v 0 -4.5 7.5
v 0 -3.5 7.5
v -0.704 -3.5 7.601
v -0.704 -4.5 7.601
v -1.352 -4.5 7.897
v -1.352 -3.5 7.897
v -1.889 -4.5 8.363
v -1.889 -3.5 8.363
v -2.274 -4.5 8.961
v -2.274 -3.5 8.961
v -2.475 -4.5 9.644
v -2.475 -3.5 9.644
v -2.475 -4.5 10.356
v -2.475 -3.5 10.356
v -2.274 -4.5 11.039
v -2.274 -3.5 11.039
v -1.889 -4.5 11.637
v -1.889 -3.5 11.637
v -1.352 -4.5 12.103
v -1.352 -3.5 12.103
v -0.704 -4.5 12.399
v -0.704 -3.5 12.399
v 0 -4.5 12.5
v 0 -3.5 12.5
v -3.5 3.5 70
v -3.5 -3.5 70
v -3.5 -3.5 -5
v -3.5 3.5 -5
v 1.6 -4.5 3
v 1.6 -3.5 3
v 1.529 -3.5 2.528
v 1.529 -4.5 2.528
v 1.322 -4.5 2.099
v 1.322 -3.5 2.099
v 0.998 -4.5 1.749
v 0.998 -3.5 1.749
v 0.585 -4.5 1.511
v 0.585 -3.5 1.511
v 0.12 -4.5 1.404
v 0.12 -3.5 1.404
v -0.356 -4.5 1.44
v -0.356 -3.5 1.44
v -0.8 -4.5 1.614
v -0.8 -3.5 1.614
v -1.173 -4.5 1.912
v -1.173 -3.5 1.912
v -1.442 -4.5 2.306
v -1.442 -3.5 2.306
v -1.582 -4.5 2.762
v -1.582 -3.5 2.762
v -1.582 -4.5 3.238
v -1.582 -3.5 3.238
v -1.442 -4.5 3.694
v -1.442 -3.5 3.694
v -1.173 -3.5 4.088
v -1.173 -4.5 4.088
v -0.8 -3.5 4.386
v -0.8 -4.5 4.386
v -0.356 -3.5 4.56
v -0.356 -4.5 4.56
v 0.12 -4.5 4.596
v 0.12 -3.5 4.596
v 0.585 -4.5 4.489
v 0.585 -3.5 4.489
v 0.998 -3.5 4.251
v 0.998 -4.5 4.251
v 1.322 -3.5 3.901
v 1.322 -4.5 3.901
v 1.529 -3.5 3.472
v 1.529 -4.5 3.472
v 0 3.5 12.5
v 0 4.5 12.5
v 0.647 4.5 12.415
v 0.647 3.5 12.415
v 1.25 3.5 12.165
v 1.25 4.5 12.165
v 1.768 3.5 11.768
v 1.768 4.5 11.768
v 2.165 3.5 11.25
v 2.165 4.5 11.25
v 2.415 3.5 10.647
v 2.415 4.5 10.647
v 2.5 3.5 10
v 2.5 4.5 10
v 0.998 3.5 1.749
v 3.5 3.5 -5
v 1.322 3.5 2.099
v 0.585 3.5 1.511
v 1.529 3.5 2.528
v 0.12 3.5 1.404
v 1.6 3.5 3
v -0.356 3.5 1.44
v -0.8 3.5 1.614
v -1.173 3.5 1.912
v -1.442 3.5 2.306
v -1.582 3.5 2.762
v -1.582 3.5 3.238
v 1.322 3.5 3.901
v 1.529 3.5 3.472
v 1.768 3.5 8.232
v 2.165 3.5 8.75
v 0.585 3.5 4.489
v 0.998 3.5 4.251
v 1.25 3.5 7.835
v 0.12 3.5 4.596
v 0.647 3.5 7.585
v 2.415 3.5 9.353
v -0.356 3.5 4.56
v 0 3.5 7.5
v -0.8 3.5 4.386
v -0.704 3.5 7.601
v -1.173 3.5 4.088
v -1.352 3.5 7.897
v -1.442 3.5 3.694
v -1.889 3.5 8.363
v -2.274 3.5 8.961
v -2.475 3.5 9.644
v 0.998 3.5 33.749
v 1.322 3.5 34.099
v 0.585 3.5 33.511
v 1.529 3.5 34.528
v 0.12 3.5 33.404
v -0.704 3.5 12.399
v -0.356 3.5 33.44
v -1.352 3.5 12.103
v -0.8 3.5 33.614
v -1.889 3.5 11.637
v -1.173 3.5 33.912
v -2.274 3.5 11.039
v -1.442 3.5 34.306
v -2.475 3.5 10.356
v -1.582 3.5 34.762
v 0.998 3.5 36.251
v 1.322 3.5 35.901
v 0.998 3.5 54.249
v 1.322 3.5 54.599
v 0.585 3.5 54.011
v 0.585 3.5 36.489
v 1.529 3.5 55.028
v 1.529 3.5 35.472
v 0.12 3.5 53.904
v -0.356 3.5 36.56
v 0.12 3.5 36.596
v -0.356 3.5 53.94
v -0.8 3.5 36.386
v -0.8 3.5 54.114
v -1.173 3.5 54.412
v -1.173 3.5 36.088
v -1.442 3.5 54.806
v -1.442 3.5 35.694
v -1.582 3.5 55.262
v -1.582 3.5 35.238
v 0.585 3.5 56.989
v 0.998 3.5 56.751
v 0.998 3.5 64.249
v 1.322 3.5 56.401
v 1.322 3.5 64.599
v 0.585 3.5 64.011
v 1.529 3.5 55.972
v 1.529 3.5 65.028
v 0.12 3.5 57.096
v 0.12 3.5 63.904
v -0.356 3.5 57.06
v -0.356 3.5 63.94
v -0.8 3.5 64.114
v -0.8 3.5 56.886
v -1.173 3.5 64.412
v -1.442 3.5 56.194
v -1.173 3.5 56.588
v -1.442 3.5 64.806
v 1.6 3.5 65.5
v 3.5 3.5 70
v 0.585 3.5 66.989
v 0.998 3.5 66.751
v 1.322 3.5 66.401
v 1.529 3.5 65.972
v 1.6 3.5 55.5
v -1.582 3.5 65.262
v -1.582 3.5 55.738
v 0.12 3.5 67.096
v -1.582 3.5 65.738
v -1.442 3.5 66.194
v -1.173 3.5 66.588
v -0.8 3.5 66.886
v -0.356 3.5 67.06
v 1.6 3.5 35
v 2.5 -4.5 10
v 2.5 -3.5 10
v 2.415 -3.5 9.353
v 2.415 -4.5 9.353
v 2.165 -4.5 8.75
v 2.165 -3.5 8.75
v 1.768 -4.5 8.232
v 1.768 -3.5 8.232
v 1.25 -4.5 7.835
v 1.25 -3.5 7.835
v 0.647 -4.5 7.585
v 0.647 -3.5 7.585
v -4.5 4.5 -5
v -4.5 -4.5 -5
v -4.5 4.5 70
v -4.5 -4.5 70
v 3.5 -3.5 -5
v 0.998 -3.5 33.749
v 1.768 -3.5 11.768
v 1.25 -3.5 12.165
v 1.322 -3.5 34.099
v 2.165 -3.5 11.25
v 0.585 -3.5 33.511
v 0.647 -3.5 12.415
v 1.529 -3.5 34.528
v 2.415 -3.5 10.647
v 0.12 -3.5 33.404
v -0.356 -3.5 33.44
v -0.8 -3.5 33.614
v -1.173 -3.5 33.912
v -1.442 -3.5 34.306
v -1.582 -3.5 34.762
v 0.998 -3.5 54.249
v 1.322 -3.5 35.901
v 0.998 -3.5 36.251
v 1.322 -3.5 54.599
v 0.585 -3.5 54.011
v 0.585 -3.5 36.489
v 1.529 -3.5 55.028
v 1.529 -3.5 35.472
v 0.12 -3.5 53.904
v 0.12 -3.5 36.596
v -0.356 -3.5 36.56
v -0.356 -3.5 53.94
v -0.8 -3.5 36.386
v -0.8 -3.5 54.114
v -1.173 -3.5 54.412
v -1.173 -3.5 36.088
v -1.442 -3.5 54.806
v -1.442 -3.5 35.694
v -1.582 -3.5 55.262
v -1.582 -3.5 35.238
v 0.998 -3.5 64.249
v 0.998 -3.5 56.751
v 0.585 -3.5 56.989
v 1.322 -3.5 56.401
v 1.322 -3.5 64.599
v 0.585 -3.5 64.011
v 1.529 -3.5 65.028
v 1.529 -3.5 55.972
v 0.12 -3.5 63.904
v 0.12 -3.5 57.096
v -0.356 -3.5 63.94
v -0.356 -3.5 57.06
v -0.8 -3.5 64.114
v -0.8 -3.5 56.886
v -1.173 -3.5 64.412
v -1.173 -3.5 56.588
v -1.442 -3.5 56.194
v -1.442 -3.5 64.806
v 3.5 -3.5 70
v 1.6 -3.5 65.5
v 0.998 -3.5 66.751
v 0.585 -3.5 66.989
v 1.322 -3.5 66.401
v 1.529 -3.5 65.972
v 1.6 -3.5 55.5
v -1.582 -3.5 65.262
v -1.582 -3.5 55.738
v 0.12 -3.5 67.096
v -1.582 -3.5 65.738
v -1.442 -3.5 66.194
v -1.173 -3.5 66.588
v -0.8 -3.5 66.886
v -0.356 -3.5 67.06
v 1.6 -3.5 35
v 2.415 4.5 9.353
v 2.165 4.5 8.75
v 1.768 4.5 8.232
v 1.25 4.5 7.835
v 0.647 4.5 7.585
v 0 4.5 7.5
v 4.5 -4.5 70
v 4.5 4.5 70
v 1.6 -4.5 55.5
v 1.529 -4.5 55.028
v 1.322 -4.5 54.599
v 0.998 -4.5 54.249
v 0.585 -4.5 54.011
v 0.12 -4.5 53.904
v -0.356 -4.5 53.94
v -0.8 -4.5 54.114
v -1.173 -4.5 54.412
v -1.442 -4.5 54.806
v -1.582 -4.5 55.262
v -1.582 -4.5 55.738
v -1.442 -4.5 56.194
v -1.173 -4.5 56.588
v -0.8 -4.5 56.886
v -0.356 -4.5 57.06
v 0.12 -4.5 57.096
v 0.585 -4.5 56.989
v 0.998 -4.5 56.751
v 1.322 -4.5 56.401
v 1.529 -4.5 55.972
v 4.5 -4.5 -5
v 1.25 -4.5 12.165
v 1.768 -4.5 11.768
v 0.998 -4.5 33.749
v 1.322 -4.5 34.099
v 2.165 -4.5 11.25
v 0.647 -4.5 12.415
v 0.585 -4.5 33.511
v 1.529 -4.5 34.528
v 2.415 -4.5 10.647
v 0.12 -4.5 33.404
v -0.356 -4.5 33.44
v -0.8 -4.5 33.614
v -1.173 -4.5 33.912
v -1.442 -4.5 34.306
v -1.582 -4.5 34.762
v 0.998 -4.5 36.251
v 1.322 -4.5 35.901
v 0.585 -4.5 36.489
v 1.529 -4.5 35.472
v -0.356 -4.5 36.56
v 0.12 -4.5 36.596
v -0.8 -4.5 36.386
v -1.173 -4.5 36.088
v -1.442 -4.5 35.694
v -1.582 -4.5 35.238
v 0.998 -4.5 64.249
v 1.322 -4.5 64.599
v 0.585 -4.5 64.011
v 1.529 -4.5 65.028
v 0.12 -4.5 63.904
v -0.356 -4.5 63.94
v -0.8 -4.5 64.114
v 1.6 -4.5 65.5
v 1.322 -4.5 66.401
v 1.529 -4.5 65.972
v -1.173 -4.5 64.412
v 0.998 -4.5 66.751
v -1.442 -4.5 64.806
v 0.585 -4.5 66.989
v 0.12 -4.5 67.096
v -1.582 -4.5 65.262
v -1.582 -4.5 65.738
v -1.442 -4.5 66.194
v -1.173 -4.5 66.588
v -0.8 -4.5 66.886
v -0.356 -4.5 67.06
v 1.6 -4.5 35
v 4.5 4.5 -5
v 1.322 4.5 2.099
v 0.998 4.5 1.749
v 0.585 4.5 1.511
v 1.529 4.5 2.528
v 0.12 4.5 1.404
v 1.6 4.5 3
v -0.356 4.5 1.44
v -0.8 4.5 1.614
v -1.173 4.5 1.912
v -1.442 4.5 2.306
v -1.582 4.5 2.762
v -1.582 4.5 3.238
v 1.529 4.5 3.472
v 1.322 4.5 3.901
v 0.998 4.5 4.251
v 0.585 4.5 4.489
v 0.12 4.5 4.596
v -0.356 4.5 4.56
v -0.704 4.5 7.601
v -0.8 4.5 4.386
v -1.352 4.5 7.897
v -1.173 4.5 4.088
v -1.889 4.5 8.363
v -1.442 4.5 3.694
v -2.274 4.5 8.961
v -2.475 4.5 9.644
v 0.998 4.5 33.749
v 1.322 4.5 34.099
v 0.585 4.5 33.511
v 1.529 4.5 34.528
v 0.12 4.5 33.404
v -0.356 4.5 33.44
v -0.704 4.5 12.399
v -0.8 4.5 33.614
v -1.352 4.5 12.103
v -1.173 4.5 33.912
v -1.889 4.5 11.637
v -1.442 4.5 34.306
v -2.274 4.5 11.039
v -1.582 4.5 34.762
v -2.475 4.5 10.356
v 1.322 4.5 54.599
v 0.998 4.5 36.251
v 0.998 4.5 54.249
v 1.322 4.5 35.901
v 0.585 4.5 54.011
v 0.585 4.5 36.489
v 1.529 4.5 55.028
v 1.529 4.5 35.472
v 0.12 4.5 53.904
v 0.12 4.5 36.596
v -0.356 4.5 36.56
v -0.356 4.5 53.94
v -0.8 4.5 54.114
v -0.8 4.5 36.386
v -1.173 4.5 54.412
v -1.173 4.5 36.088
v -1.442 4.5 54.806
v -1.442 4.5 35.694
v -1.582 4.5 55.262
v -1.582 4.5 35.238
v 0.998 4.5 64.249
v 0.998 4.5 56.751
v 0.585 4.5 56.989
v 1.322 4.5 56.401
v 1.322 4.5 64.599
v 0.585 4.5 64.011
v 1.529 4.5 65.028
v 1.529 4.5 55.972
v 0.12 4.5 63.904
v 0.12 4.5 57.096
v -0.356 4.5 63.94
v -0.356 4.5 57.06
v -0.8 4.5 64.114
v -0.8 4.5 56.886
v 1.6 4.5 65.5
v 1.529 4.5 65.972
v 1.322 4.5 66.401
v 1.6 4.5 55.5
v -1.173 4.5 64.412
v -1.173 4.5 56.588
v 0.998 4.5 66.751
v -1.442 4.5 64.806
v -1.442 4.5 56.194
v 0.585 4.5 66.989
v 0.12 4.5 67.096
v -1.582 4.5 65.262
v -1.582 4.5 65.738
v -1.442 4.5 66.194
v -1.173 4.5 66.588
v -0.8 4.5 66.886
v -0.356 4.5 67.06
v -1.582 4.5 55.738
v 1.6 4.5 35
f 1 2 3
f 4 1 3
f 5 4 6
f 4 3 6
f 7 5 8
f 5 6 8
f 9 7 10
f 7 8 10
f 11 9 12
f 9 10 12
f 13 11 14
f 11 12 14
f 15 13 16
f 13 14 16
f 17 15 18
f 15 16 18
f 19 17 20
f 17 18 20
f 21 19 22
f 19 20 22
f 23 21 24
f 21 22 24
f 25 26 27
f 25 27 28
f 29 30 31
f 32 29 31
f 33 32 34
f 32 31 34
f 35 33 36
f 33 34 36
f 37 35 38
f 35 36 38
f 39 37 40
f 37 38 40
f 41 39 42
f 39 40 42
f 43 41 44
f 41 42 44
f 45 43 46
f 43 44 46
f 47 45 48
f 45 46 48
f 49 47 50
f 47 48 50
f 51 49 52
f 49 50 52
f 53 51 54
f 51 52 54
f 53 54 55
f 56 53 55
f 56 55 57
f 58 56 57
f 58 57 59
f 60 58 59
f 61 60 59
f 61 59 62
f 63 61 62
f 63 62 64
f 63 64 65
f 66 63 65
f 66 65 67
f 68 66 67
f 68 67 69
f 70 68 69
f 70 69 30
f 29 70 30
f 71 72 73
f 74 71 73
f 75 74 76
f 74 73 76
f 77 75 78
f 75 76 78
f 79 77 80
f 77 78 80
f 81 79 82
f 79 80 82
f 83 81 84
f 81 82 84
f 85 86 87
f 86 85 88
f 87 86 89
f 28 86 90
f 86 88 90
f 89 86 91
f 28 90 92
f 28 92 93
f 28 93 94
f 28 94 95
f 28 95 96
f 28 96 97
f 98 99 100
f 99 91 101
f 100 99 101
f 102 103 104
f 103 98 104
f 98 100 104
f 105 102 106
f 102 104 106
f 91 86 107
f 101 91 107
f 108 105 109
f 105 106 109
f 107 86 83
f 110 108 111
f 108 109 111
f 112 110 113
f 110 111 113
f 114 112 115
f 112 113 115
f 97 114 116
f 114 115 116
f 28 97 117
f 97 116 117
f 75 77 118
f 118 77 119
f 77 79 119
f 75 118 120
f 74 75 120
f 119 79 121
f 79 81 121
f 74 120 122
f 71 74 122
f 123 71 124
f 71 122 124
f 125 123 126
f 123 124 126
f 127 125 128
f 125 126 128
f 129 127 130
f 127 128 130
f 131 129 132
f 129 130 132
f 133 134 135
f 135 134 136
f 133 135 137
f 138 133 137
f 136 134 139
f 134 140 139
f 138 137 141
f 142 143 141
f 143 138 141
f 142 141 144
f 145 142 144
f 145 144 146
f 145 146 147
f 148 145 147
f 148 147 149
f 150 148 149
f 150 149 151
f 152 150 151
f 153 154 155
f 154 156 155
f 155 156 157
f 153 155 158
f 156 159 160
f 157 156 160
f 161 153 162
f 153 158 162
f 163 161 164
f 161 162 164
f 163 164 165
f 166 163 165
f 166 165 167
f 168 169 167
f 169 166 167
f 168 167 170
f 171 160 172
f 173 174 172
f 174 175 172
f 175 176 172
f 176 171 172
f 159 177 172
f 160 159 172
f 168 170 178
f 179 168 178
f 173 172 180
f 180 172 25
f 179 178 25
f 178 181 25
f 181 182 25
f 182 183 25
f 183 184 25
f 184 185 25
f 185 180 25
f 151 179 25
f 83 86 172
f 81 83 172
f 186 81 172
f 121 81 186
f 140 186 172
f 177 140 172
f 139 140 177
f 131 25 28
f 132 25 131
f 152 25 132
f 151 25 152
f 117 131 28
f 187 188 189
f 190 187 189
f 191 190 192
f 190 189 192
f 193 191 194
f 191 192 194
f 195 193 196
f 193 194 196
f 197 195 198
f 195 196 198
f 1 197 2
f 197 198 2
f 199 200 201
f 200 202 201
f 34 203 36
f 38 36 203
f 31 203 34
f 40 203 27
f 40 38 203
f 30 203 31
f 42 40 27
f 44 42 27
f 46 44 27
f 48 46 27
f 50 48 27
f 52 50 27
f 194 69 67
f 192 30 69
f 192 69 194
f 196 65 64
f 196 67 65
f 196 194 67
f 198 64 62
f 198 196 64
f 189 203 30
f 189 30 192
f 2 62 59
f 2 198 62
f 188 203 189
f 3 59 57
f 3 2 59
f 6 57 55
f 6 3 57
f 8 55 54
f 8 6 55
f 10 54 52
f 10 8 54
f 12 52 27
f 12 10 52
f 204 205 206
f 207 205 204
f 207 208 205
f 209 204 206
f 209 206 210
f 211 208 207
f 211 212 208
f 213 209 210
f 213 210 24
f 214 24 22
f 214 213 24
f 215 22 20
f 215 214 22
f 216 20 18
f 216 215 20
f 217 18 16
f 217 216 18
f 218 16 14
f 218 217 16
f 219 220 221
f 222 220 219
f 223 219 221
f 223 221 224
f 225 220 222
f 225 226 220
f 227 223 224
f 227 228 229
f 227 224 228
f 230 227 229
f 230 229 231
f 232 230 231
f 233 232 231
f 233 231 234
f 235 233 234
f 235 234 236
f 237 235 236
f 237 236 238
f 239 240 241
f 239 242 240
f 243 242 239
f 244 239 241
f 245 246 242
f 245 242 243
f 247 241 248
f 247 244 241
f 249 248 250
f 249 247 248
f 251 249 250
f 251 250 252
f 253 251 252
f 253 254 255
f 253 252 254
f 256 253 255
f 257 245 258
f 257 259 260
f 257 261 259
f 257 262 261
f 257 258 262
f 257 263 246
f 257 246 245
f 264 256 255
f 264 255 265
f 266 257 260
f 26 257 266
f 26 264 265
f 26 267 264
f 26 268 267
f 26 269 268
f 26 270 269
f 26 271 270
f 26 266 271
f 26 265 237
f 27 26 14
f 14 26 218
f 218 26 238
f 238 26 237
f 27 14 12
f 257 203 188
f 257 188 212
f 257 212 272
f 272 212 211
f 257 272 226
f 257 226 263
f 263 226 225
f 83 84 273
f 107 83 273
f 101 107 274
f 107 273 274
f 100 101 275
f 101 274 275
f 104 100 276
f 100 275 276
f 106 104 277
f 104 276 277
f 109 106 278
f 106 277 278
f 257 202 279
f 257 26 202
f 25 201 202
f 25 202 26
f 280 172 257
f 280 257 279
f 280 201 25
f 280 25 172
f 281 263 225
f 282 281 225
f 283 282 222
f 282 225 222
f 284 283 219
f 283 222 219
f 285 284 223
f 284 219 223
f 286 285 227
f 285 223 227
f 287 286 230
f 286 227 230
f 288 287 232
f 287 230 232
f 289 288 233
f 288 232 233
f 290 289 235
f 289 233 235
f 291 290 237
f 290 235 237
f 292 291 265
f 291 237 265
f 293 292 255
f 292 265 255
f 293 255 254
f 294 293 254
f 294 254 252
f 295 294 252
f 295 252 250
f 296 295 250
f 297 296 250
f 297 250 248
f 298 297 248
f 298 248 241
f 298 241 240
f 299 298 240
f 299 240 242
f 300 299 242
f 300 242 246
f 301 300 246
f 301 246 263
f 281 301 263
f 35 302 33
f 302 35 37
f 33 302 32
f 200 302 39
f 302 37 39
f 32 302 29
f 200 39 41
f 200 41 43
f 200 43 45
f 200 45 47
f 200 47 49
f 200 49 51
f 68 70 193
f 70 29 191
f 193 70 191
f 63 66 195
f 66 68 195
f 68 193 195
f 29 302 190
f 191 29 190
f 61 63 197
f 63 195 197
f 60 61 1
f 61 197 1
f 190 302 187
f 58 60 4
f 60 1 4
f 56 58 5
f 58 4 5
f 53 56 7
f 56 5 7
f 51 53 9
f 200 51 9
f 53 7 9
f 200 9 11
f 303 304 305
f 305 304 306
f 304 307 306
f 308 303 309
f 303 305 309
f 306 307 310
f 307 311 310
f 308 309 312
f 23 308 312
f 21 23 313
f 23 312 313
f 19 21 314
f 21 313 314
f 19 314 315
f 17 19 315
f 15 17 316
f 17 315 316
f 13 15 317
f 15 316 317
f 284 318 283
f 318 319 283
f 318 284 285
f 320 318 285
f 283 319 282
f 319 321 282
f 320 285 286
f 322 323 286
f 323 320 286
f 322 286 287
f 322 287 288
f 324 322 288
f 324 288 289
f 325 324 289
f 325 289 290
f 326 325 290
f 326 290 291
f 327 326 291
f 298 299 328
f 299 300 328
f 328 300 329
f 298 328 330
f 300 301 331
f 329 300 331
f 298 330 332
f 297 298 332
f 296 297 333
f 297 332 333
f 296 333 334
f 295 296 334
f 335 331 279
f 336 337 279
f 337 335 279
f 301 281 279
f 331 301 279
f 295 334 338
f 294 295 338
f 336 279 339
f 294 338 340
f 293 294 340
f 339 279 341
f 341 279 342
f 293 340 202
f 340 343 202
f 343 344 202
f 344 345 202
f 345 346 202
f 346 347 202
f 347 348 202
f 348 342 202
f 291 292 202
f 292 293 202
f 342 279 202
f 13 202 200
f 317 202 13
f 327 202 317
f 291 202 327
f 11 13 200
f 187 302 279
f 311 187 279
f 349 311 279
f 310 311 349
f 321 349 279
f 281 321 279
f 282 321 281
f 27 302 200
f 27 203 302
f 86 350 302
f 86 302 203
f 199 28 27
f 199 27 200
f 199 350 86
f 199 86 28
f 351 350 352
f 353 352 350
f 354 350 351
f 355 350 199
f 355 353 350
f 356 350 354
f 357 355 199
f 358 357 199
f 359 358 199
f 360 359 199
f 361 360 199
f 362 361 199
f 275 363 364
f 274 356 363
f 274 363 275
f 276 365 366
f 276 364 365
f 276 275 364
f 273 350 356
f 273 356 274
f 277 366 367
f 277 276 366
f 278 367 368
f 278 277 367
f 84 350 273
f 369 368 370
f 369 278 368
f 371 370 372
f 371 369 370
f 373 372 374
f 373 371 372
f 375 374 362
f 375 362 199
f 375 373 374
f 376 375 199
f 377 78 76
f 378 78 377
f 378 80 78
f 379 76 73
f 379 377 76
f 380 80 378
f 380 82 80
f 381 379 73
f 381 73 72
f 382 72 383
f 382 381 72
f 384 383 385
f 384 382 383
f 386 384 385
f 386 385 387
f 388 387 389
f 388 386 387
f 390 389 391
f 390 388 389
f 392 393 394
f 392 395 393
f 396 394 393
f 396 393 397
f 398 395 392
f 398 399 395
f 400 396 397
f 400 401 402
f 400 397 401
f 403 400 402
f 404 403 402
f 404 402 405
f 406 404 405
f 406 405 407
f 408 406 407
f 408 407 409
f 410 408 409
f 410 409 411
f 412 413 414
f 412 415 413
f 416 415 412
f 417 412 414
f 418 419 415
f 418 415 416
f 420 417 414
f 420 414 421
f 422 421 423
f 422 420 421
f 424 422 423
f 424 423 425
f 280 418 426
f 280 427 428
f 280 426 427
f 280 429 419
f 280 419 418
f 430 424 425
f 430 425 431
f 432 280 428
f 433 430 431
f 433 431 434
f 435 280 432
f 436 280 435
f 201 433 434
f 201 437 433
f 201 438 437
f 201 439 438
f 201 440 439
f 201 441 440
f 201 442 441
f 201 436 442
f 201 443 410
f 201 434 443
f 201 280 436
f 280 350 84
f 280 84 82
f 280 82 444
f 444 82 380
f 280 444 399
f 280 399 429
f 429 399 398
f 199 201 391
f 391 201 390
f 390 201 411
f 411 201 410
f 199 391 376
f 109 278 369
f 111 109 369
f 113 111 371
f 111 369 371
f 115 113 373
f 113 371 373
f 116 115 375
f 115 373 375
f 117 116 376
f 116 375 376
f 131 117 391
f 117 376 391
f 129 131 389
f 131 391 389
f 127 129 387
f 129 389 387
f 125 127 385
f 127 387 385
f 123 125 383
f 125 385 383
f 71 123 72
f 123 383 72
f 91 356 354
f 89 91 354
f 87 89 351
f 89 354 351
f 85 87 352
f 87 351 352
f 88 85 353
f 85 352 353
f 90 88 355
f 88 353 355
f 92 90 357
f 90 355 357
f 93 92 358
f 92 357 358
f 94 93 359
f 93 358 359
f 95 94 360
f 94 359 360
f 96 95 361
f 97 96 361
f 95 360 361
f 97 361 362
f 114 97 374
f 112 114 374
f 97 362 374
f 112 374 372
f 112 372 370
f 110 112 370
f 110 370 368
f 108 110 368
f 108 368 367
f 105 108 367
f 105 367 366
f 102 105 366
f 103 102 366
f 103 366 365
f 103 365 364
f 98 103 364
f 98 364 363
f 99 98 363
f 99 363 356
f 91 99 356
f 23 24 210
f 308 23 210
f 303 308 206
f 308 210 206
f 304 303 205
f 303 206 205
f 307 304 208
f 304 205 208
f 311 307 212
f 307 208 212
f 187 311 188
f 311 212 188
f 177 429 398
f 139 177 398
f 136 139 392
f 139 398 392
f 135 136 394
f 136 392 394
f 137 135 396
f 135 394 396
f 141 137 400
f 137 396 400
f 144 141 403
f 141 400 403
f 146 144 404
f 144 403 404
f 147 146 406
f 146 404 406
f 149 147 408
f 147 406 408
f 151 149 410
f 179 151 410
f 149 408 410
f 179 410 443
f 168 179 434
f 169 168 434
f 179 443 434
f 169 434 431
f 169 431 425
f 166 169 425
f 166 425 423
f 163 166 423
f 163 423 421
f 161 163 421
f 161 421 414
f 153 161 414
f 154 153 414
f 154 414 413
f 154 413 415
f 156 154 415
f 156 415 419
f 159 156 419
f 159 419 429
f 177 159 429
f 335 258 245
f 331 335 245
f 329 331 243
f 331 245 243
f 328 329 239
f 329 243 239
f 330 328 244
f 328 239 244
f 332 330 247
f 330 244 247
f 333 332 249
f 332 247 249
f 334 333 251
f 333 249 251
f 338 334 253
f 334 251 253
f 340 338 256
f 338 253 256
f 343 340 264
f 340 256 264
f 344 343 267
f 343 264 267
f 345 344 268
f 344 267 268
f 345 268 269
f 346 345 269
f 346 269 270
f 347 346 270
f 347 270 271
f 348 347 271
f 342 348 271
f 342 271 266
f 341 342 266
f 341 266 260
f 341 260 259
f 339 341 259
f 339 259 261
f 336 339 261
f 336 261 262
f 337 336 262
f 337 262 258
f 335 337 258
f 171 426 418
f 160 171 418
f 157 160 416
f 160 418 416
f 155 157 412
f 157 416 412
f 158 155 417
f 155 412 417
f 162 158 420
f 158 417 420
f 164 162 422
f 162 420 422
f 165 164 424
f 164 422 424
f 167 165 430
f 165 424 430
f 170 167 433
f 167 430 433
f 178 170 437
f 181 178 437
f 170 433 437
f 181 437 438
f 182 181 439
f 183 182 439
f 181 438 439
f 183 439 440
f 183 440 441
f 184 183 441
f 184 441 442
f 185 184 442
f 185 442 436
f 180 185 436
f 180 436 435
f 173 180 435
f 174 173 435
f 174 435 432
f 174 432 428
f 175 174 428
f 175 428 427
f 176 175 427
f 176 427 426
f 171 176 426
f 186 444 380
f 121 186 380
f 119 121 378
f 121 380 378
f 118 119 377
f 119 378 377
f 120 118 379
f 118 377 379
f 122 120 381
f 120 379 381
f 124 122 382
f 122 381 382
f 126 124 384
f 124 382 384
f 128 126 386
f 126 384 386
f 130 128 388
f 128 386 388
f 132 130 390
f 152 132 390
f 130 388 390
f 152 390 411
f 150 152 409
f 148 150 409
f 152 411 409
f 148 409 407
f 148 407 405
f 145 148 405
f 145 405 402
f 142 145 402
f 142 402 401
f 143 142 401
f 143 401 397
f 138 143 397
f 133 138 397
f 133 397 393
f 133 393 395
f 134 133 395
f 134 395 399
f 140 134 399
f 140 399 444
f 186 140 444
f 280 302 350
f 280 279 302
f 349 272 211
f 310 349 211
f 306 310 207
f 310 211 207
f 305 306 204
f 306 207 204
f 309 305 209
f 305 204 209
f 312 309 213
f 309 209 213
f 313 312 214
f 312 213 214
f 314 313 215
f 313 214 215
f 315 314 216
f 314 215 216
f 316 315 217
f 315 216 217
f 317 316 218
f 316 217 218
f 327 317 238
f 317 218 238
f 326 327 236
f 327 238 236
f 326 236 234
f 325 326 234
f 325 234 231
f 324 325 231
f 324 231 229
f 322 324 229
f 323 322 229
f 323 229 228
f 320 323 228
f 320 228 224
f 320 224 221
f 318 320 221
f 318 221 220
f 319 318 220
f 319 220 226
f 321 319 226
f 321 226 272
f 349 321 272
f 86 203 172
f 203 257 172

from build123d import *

# Parameters (mm, degrees)
SKETCH_1_W          = 9
SKETCH_1_H          = 9
SKETCH_1_W_2        = 7
SKETCH_1_H_2        = 7
EXTRUDE_1_DEPTH     = 70
CUT_EXTRUDE_1_DEPTH = 100
SKETCH_3_R          = 1.6
CUT_EXTRUDE_2_DEPTH = 100
SKETCH_4_R          = 1.6
CUT_EXTRUDE_3_DEPTH = 100
SKETCH_5_R          = 1.6
CUT_EXTRUDE_4_DEPTH = 10
SKETCH_6_W          = 9
SKETCH_6_H          = 9
SKETCH_6_W_2        = 7
SKETCH_6_H_2        = 7
EXTRUDE_2_DEPTH     = 5


with BuildPart() as part:
    # ｽｹｯﾁ1 → ﾎﾞｽ - 押し出し1 (new body)
    with BuildSketch(Plane.XY):
        Rectangle(SKETCH_1_W, SKETCH_1_H)
        Rectangle(SKETCH_1_W_2, SKETCH_1_H_2, mode=Mode.SUBTRACT)
    extrude(amount=EXTRUDE_1_DEPTH)

    # ｽｹｯﾁ2 → ｶｯﾄ - 押し出し1 (cut)
    with BuildSketch(Plane(origin=(0, 4.5, 0), x_dir=(1, 0, 0), z_dir=(0, 1, 0))):
        with BuildLine():
            ThreePointArc((2.5, -10), (1.767766953, -8.232233047), (0, -7.5))
            Line((0, -7.5), (0, -10))
            Line((0, -10), (0, -12.5))
            ThreePointArc((0, -12.5), (1.767766953, -11.767766953), (2.5, -10))
        make_face()
        with BuildLine():
            Line((0, -10), (0, -7.5))
            ThreePointArc((0, -7.5), (-2.5, -10), (0, -12.5))
            Line((0, -12.5), (0, -10))
        make_face()
    extrude(amount=-CUT_EXTRUDE_1_DEPTH, mode=Mode.SUBTRACT)

    # ｽｹｯﾁ3 → ｶｯﾄ - 押し出し2 (cut)
    with BuildSketch(Plane(origin=(0, 4.5, 0), x_dir=(1, 0, 0), z_dir=(0, 1, 0))):
        with Locations((0, -3)):
            Circle(SKETCH_3_R)
    extrude(amount=-CUT_EXTRUDE_2_DEPTH, mode=Mode.SUBTRACT)

    # ｽｹｯﾁ4 → ｶｯﾄ - 押し出し3 (cut)
    with BuildSketch(Plane(origin=(0, 4.5, 0), x_dir=(1, 0, 0), z_dir=(0, 1, 0))):
        with Locations((0, -65.5)):
            Circle(SKETCH_4_R)
        with Locations((0, -55.5)):
            Circle(SKETCH_4_R)
    extrude(amount=-CUT_EXTRUDE_3_DEPTH, mode=Mode.SUBTRACT)

    # ｽｹｯﾁ5 → ｶｯﾄ - 押し出し4 (cut, through all)
    with BuildSketch(Plane(origin=(0, 4.5, 0), x_dir=(1, 0, 0), z_dir=(0, 1, 0))):
        with Locations((0, -35)):
            Circle(SKETCH_5_R)
    extrude(amount=-CUT_EXTRUDE_4_DEPTH, mode=Mode.SUBTRACT)

    # ｽｹｯﾁ6 → ﾎﾞｽ - 押し出し2 (add)
    with BuildSketch(Plane(origin=(0, 0, 0), x_dir=(-1, 0, 0), z_dir=(0, 0, -1))):
        Rectangle(SKETCH_6_W, SKETCH_6_H)
        Rectangle(SKETCH_6_W_2, SKETCH_6_H_2, mode=Mode.SUBTRACT)
    extrude(amount=EXTRUDE_2_DEPTH)


solid = part.part
